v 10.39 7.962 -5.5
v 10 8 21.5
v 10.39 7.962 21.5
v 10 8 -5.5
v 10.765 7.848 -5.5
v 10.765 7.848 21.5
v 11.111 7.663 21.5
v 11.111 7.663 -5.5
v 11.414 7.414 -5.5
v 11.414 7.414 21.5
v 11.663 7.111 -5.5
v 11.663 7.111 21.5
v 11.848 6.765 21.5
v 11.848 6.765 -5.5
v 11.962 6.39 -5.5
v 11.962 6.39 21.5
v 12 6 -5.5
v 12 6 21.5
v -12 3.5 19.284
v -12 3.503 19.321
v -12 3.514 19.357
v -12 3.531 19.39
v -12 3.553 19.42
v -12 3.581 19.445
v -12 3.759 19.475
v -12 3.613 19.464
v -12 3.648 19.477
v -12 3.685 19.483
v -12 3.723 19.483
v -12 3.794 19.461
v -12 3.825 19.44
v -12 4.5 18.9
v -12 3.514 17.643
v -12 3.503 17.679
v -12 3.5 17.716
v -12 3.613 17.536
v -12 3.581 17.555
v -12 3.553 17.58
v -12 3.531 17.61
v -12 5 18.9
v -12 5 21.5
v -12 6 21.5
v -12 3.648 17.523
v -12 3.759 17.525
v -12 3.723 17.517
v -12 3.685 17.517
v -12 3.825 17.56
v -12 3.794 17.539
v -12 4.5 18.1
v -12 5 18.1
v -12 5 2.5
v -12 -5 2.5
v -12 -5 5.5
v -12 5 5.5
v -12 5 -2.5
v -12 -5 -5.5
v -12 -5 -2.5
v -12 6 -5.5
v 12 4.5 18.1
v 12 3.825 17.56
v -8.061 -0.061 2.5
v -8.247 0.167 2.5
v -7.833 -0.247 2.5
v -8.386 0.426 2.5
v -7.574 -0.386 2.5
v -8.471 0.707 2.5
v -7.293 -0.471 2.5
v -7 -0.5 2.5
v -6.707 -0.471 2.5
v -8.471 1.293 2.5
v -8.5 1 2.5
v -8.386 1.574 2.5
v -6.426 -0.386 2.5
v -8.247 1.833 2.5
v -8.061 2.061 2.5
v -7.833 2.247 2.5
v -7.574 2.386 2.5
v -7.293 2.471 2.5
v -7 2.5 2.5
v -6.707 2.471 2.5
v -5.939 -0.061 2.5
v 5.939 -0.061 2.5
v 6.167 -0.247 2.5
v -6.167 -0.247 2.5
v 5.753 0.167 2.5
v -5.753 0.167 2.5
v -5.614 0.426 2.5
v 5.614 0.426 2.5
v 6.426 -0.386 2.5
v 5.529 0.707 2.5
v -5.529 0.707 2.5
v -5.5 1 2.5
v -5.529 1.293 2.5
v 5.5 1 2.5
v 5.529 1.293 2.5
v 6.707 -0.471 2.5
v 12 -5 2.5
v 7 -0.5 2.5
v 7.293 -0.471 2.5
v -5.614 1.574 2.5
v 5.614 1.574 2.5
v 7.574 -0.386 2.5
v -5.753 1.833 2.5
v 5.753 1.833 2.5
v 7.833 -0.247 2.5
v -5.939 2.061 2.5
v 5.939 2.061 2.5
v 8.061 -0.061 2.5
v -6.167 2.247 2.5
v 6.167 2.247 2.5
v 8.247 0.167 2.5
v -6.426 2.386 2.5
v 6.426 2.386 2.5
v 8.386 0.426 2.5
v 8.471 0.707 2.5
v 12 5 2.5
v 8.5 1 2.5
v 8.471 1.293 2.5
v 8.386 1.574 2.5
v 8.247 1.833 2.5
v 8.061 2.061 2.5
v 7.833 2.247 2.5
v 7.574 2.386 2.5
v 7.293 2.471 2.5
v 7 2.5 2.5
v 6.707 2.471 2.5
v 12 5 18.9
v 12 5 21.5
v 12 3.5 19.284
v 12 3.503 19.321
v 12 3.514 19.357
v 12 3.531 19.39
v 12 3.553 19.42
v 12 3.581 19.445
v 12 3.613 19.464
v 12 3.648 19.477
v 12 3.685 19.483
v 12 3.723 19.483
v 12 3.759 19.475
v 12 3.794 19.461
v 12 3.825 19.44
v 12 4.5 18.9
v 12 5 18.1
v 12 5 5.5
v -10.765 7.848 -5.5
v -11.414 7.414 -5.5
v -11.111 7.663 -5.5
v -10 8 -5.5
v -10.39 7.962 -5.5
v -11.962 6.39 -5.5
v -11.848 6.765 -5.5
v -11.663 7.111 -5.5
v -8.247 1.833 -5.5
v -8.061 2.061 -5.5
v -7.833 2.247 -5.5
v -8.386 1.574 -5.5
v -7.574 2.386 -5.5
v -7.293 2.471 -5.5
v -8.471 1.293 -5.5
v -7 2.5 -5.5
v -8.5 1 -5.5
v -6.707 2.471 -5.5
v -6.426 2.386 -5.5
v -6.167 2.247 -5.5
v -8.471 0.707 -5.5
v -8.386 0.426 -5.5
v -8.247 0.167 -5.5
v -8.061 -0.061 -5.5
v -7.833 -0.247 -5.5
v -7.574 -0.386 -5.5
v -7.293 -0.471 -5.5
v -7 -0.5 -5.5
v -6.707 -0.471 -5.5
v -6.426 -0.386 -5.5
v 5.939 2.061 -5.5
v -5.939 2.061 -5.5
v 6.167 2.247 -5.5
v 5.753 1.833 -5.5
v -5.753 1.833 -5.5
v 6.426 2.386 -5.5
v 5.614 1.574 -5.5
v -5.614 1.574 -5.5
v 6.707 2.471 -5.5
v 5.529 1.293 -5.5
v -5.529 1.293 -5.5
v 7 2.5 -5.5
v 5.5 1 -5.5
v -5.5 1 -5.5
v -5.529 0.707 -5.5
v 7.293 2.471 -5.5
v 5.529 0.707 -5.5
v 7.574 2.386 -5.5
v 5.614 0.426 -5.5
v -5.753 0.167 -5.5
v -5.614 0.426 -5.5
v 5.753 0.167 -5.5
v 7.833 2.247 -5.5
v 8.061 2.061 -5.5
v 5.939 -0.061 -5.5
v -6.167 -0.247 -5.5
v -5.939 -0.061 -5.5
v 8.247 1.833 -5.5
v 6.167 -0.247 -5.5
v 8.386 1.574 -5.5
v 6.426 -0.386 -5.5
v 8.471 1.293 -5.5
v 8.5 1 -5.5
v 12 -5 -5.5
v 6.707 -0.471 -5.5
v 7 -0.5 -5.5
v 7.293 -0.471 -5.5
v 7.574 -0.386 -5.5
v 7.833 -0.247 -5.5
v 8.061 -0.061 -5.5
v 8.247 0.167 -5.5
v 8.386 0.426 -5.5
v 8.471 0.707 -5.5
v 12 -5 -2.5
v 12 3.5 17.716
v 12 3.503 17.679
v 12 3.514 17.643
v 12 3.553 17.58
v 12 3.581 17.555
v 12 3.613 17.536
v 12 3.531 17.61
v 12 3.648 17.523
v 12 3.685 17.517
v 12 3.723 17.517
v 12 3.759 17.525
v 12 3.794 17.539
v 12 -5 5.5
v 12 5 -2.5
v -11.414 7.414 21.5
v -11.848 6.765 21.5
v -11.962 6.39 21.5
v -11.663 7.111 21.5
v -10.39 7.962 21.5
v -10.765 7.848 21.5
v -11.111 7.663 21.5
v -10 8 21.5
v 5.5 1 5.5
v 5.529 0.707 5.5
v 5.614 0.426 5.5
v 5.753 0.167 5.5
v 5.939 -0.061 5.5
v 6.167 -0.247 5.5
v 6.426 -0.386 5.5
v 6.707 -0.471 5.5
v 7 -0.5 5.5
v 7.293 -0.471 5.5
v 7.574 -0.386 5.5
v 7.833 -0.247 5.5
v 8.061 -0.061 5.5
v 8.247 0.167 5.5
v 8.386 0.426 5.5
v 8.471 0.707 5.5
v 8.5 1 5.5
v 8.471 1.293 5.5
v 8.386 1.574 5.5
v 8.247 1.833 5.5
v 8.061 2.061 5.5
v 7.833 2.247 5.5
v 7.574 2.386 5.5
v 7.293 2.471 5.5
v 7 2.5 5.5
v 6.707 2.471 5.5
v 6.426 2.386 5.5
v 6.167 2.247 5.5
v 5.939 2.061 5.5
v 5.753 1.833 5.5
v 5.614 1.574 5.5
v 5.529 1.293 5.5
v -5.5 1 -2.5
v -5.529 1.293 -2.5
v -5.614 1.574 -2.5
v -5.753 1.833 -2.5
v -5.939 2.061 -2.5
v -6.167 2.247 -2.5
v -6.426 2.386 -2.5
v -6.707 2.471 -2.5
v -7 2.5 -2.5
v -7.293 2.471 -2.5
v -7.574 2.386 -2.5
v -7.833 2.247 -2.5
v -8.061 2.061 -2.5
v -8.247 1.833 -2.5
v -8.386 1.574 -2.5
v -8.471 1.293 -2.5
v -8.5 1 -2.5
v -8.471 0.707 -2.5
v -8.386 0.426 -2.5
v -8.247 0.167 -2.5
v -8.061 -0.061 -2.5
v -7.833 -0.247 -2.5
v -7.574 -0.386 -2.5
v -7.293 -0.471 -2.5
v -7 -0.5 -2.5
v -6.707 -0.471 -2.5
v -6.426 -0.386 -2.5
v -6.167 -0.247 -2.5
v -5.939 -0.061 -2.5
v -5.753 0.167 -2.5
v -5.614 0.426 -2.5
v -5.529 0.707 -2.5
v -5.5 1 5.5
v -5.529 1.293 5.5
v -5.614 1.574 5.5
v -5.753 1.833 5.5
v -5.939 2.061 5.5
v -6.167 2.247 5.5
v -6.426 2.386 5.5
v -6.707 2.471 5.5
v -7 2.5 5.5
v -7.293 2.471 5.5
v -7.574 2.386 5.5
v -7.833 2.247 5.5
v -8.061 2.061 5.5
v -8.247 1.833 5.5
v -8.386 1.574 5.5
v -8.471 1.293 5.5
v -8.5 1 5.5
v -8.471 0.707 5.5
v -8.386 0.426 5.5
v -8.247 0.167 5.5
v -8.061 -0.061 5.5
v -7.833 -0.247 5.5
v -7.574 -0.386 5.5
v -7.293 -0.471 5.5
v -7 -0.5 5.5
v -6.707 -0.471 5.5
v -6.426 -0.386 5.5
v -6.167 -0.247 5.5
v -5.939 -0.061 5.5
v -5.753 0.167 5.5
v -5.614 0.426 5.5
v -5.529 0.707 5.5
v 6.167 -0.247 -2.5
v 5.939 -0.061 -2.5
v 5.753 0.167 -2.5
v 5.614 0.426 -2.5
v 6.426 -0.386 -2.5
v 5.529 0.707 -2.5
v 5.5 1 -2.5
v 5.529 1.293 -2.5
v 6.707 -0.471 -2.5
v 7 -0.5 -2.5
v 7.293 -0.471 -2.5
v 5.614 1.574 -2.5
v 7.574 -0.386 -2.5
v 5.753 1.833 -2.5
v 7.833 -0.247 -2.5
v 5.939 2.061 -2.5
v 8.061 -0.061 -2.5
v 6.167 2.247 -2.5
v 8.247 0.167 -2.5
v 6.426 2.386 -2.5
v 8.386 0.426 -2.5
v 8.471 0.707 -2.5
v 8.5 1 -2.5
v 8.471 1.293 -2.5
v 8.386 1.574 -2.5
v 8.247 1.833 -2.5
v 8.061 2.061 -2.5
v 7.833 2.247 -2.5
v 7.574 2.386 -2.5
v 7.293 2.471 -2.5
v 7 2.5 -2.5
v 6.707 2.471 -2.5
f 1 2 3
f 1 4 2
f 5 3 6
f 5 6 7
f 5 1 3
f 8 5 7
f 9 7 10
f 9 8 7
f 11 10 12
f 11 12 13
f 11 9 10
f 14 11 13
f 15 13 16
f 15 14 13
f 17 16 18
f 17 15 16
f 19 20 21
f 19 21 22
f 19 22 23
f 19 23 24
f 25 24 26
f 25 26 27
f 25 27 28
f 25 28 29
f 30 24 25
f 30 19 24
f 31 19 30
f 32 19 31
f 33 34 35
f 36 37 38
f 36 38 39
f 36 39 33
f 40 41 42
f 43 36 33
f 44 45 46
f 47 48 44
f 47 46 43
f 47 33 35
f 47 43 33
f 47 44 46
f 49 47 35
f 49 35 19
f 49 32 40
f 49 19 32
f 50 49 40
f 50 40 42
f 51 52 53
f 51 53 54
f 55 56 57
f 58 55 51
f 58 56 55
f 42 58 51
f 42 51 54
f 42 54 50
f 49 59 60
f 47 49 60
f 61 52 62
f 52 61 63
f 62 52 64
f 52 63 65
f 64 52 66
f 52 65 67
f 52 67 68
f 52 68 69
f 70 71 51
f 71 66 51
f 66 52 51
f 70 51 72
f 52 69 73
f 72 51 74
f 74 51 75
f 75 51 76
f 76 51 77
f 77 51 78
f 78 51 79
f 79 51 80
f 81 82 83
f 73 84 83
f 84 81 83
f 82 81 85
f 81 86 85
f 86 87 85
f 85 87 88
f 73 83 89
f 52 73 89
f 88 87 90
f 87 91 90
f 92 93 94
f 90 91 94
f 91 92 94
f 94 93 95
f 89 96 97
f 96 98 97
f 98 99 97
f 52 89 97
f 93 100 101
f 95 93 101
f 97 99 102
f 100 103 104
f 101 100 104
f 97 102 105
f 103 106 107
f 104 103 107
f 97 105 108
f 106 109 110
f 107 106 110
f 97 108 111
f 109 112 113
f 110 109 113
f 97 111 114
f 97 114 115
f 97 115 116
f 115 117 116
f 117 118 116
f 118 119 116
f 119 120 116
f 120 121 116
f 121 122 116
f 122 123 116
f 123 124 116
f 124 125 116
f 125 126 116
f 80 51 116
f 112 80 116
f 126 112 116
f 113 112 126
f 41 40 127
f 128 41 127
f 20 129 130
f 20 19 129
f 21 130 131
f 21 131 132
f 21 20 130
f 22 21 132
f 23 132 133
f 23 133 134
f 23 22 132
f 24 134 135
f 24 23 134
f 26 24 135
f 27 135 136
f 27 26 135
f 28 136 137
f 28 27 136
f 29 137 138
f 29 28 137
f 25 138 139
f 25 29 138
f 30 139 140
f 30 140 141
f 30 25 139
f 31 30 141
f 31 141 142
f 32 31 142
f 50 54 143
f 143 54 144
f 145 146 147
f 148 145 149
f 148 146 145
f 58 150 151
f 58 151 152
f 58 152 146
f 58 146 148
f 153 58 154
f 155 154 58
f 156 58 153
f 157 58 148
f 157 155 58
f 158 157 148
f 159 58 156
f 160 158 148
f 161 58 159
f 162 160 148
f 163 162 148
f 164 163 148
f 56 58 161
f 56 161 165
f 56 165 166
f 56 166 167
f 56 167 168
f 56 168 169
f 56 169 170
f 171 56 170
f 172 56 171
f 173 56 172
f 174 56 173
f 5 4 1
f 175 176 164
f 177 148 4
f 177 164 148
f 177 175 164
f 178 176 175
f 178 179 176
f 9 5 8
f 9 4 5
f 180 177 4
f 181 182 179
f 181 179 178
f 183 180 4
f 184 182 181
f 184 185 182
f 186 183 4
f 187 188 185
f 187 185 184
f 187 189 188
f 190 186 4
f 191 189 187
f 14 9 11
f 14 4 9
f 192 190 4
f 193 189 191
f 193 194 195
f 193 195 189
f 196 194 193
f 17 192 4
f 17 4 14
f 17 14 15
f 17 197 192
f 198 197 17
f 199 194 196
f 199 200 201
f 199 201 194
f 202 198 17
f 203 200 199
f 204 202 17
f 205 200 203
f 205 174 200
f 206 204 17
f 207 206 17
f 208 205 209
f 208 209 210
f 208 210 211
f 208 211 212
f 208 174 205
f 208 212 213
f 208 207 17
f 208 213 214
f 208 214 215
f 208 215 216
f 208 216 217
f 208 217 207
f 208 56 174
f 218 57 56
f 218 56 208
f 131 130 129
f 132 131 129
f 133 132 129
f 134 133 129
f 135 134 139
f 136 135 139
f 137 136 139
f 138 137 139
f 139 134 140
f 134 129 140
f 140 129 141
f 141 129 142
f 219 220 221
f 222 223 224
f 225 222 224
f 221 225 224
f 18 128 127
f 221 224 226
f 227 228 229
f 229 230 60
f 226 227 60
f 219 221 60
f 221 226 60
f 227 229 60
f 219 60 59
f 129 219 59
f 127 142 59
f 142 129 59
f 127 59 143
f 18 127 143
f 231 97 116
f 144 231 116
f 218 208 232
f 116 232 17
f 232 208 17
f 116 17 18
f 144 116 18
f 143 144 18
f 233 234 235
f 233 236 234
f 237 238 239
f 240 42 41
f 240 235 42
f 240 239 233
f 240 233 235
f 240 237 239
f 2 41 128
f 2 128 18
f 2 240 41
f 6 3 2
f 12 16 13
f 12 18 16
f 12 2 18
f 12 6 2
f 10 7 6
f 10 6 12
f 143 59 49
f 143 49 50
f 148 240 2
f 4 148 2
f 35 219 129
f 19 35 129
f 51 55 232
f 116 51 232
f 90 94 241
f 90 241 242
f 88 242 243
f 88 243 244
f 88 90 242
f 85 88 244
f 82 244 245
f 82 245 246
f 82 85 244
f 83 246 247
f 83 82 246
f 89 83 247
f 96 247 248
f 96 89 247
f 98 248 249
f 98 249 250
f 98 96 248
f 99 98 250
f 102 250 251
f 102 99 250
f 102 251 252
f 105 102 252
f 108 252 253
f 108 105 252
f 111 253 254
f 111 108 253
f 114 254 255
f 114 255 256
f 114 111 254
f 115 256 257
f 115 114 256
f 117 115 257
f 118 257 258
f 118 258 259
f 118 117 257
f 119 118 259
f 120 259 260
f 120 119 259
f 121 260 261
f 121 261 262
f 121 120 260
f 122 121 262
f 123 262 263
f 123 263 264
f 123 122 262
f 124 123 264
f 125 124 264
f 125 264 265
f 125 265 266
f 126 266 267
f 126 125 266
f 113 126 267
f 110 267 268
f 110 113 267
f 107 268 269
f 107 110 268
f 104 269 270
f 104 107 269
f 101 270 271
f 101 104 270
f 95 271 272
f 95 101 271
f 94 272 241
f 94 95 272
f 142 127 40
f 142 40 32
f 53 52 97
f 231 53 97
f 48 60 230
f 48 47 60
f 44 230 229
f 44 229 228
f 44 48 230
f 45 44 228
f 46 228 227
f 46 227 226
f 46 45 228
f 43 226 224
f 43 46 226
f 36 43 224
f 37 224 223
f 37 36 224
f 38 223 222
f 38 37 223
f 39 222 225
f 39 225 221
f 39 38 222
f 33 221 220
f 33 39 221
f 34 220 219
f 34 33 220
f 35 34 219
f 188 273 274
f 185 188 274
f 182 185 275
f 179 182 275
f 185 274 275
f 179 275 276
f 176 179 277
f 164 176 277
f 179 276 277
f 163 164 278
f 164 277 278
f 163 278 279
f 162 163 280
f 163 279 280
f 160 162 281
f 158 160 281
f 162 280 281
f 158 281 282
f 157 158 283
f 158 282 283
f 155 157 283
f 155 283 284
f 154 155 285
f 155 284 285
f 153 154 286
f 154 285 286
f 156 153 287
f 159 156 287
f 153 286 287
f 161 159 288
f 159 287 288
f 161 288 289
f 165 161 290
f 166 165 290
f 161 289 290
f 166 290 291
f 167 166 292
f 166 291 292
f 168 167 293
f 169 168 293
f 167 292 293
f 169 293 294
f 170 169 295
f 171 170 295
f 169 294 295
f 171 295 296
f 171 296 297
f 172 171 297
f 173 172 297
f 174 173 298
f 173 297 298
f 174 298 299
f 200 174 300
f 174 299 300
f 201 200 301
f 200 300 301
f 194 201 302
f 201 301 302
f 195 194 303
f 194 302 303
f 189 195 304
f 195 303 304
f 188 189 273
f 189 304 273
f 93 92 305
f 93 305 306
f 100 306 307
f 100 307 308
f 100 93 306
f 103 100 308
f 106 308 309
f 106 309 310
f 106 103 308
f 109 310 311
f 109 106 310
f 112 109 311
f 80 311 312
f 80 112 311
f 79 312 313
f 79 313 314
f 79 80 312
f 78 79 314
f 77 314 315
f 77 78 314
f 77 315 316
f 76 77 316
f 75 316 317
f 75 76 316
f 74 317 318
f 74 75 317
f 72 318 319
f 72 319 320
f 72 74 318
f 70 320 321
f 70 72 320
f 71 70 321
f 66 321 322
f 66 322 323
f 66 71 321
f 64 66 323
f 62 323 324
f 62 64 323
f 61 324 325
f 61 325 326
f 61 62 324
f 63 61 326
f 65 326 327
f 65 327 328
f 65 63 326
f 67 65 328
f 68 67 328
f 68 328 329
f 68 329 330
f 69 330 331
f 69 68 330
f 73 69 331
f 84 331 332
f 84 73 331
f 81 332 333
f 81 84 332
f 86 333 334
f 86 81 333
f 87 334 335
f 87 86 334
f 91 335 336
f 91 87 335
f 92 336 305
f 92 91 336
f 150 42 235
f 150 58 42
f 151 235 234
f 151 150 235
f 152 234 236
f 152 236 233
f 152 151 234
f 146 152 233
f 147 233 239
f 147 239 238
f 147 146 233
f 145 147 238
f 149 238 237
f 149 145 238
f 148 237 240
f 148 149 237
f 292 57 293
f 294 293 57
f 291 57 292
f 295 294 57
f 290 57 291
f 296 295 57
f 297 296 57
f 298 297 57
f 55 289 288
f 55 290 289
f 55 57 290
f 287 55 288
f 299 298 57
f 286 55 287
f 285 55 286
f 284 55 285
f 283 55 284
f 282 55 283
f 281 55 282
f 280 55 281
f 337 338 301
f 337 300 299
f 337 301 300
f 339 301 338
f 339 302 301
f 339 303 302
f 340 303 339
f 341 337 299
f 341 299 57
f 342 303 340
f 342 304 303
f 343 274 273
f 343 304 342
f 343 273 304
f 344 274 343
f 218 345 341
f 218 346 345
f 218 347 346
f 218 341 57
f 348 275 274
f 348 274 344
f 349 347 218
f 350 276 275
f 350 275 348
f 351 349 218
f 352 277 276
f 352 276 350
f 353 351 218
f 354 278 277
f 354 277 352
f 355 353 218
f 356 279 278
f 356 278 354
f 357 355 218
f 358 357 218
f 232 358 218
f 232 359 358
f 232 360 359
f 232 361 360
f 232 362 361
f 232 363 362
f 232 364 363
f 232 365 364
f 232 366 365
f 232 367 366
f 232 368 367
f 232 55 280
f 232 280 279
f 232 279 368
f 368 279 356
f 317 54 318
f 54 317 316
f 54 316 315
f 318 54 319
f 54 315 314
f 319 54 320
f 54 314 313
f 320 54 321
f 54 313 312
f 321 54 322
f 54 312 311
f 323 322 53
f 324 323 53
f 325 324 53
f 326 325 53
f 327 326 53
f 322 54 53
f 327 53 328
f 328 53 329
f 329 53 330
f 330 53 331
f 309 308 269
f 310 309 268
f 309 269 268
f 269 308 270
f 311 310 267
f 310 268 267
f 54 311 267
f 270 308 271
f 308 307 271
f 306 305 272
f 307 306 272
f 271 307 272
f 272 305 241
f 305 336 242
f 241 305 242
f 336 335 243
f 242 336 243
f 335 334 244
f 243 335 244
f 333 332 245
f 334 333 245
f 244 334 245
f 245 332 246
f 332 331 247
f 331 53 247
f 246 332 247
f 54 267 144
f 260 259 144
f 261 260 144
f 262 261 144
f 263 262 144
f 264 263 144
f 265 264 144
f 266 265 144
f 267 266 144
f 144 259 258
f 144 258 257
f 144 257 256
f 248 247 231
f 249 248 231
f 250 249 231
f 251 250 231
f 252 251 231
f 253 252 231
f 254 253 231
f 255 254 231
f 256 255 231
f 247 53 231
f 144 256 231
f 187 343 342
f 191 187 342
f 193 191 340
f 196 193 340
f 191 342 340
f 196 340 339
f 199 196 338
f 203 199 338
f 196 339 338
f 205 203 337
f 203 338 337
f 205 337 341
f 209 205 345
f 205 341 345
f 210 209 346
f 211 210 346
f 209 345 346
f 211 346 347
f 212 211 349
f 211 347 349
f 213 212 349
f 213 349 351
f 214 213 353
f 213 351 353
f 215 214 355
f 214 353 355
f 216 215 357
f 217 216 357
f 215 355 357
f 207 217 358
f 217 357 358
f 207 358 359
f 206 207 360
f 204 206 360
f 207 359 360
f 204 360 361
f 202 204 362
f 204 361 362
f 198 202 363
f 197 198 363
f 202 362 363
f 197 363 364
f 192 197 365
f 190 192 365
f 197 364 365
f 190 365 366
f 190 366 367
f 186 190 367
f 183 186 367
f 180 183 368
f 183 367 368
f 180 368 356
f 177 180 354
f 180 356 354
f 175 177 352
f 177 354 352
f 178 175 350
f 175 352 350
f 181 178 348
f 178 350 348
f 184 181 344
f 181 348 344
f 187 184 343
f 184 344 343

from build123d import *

# Parameters (mm, degrees)
EXTRUDE_START   = 2.5
SKETCH_1_W      = 24
SKETCH_1_H      = 10
SKETCH_1_R      = 1.5
EXTRUDE_1_DEPTH = 3
EXTRUDE_START_2 = -2.5
SKETCH_2_W      = 24
SKETCH_2_H      = 10
SKETCH_2_R      = 1.5
EXTRUDE_2_DEPTH = 3
SKETCH_3_W      = 24
SKETCH_3_H      = 11
EXTRUDE_3_DEPTH = 3
SKETCH_4_W      = 24
SKETCH_4_H      = 3
EXTRUDE_4_DEPTH = 16
EXTRUDE_5_DEPTH = 24
FILLET_1_R      = 0.2
FILLET_2_R      = 2


with BuildPart() as part:
    # 草图1 → 凸台-拉伸1 (new body)
    with BuildSketch(Plane.XY.offset(EXTRUDE_START)):
        Rectangle(SKETCH_1_W, SKETCH_1_H)
        with Locations((-7, 1)):
            Circle(SKETCH_1_R, mode=Mode.SUBTRACT)
        with Locations(Location((7, 1, 0), (0, 0, 180))):
            Circle(SKETCH_1_R, mode=Mode.SUBTRACT)
    extrude(amount=EXTRUDE_1_DEPTH)



with BuildPart() as body_2:
    # 草图2 → 凸台-拉伸2 (new body)
    with BuildSketch(Plane.XY.offset(EXTRUDE_START_2)):
        Rectangle(SKETCH_2_W, SKETCH_2_H)
        with Locations(Location((7, 1, 0), (0, 0, 180))):
            Circle(SKETCH_2_R, mode=Mode.SUBTRACT)
        with Locations((-7, 1)):
            Circle(SKETCH_2_R, mode=Mode.SUBTRACT)
    extrude(amount=-EXTRUDE_2_DEPTH)


with BuildPart() as part_1:
    add(part.part)

    add(body_2.part)  # 凸台-拉伸3 merges body 2
    # 草图3 → 凸台-拉伸3 (add)
    with BuildSketch(Plane(origin=(0, 5, 0), x_dir=(1, 0, 0), z_dir=(0, 1, 0))):
        Rectangle(SKETCH_3_W, SKETCH_3_H)
    extrude(amount=EXTRUDE_3_DEPTH)

    # 草图4 → 凸台-拉伸4 (add)
    with BuildSketch(Plane.XY.offset(5.5)):
        with Locations((0, 6.5)):
            Rectangle(SKETCH_4_W, SKETCH_4_H)
    extrude(amount=EXTRUDE_4_DEPTH)

    # 草图5 → 凸台-拉伸5 (add)
    with BuildSketch(Plane(origin=(12, 0, 0), x_dir=(0, 0, -1), z_dir=(1, 0, 0))):
        Polygon((-18.5, 5), (-17.3, 3.5), (-19.7, 3.5), align=None)
        Polygon((-18.9, 4.5), (-18.5, 5), (-18.9, 5), align=None)
        Polygon((-18.1, 5), (-18.5, 5), (-18.1, 4.5), align=None)
    extrude(amount=-EXTRUDE_5_DEPTH)

    # 圆角1
    fillet_1_edges = [part_1.edges().sort_by_distance(p)[0] for p in [
        (0, 3.5, 17.3),
        (0, 3.5, 19.7),
    ]]
    fillet(fillet_1_edges, radius=FILLET_1_R)

    # 圆角2
    fillet_2_edges = [part_1.edges().sort_by_distance(p)[0] for p in [
        (-12, 8, 8),
        (12, 8, 8),
    ]]
    fillet(fillet_2_edges, radius=FILLET_2_R)


solid = part_1.part
